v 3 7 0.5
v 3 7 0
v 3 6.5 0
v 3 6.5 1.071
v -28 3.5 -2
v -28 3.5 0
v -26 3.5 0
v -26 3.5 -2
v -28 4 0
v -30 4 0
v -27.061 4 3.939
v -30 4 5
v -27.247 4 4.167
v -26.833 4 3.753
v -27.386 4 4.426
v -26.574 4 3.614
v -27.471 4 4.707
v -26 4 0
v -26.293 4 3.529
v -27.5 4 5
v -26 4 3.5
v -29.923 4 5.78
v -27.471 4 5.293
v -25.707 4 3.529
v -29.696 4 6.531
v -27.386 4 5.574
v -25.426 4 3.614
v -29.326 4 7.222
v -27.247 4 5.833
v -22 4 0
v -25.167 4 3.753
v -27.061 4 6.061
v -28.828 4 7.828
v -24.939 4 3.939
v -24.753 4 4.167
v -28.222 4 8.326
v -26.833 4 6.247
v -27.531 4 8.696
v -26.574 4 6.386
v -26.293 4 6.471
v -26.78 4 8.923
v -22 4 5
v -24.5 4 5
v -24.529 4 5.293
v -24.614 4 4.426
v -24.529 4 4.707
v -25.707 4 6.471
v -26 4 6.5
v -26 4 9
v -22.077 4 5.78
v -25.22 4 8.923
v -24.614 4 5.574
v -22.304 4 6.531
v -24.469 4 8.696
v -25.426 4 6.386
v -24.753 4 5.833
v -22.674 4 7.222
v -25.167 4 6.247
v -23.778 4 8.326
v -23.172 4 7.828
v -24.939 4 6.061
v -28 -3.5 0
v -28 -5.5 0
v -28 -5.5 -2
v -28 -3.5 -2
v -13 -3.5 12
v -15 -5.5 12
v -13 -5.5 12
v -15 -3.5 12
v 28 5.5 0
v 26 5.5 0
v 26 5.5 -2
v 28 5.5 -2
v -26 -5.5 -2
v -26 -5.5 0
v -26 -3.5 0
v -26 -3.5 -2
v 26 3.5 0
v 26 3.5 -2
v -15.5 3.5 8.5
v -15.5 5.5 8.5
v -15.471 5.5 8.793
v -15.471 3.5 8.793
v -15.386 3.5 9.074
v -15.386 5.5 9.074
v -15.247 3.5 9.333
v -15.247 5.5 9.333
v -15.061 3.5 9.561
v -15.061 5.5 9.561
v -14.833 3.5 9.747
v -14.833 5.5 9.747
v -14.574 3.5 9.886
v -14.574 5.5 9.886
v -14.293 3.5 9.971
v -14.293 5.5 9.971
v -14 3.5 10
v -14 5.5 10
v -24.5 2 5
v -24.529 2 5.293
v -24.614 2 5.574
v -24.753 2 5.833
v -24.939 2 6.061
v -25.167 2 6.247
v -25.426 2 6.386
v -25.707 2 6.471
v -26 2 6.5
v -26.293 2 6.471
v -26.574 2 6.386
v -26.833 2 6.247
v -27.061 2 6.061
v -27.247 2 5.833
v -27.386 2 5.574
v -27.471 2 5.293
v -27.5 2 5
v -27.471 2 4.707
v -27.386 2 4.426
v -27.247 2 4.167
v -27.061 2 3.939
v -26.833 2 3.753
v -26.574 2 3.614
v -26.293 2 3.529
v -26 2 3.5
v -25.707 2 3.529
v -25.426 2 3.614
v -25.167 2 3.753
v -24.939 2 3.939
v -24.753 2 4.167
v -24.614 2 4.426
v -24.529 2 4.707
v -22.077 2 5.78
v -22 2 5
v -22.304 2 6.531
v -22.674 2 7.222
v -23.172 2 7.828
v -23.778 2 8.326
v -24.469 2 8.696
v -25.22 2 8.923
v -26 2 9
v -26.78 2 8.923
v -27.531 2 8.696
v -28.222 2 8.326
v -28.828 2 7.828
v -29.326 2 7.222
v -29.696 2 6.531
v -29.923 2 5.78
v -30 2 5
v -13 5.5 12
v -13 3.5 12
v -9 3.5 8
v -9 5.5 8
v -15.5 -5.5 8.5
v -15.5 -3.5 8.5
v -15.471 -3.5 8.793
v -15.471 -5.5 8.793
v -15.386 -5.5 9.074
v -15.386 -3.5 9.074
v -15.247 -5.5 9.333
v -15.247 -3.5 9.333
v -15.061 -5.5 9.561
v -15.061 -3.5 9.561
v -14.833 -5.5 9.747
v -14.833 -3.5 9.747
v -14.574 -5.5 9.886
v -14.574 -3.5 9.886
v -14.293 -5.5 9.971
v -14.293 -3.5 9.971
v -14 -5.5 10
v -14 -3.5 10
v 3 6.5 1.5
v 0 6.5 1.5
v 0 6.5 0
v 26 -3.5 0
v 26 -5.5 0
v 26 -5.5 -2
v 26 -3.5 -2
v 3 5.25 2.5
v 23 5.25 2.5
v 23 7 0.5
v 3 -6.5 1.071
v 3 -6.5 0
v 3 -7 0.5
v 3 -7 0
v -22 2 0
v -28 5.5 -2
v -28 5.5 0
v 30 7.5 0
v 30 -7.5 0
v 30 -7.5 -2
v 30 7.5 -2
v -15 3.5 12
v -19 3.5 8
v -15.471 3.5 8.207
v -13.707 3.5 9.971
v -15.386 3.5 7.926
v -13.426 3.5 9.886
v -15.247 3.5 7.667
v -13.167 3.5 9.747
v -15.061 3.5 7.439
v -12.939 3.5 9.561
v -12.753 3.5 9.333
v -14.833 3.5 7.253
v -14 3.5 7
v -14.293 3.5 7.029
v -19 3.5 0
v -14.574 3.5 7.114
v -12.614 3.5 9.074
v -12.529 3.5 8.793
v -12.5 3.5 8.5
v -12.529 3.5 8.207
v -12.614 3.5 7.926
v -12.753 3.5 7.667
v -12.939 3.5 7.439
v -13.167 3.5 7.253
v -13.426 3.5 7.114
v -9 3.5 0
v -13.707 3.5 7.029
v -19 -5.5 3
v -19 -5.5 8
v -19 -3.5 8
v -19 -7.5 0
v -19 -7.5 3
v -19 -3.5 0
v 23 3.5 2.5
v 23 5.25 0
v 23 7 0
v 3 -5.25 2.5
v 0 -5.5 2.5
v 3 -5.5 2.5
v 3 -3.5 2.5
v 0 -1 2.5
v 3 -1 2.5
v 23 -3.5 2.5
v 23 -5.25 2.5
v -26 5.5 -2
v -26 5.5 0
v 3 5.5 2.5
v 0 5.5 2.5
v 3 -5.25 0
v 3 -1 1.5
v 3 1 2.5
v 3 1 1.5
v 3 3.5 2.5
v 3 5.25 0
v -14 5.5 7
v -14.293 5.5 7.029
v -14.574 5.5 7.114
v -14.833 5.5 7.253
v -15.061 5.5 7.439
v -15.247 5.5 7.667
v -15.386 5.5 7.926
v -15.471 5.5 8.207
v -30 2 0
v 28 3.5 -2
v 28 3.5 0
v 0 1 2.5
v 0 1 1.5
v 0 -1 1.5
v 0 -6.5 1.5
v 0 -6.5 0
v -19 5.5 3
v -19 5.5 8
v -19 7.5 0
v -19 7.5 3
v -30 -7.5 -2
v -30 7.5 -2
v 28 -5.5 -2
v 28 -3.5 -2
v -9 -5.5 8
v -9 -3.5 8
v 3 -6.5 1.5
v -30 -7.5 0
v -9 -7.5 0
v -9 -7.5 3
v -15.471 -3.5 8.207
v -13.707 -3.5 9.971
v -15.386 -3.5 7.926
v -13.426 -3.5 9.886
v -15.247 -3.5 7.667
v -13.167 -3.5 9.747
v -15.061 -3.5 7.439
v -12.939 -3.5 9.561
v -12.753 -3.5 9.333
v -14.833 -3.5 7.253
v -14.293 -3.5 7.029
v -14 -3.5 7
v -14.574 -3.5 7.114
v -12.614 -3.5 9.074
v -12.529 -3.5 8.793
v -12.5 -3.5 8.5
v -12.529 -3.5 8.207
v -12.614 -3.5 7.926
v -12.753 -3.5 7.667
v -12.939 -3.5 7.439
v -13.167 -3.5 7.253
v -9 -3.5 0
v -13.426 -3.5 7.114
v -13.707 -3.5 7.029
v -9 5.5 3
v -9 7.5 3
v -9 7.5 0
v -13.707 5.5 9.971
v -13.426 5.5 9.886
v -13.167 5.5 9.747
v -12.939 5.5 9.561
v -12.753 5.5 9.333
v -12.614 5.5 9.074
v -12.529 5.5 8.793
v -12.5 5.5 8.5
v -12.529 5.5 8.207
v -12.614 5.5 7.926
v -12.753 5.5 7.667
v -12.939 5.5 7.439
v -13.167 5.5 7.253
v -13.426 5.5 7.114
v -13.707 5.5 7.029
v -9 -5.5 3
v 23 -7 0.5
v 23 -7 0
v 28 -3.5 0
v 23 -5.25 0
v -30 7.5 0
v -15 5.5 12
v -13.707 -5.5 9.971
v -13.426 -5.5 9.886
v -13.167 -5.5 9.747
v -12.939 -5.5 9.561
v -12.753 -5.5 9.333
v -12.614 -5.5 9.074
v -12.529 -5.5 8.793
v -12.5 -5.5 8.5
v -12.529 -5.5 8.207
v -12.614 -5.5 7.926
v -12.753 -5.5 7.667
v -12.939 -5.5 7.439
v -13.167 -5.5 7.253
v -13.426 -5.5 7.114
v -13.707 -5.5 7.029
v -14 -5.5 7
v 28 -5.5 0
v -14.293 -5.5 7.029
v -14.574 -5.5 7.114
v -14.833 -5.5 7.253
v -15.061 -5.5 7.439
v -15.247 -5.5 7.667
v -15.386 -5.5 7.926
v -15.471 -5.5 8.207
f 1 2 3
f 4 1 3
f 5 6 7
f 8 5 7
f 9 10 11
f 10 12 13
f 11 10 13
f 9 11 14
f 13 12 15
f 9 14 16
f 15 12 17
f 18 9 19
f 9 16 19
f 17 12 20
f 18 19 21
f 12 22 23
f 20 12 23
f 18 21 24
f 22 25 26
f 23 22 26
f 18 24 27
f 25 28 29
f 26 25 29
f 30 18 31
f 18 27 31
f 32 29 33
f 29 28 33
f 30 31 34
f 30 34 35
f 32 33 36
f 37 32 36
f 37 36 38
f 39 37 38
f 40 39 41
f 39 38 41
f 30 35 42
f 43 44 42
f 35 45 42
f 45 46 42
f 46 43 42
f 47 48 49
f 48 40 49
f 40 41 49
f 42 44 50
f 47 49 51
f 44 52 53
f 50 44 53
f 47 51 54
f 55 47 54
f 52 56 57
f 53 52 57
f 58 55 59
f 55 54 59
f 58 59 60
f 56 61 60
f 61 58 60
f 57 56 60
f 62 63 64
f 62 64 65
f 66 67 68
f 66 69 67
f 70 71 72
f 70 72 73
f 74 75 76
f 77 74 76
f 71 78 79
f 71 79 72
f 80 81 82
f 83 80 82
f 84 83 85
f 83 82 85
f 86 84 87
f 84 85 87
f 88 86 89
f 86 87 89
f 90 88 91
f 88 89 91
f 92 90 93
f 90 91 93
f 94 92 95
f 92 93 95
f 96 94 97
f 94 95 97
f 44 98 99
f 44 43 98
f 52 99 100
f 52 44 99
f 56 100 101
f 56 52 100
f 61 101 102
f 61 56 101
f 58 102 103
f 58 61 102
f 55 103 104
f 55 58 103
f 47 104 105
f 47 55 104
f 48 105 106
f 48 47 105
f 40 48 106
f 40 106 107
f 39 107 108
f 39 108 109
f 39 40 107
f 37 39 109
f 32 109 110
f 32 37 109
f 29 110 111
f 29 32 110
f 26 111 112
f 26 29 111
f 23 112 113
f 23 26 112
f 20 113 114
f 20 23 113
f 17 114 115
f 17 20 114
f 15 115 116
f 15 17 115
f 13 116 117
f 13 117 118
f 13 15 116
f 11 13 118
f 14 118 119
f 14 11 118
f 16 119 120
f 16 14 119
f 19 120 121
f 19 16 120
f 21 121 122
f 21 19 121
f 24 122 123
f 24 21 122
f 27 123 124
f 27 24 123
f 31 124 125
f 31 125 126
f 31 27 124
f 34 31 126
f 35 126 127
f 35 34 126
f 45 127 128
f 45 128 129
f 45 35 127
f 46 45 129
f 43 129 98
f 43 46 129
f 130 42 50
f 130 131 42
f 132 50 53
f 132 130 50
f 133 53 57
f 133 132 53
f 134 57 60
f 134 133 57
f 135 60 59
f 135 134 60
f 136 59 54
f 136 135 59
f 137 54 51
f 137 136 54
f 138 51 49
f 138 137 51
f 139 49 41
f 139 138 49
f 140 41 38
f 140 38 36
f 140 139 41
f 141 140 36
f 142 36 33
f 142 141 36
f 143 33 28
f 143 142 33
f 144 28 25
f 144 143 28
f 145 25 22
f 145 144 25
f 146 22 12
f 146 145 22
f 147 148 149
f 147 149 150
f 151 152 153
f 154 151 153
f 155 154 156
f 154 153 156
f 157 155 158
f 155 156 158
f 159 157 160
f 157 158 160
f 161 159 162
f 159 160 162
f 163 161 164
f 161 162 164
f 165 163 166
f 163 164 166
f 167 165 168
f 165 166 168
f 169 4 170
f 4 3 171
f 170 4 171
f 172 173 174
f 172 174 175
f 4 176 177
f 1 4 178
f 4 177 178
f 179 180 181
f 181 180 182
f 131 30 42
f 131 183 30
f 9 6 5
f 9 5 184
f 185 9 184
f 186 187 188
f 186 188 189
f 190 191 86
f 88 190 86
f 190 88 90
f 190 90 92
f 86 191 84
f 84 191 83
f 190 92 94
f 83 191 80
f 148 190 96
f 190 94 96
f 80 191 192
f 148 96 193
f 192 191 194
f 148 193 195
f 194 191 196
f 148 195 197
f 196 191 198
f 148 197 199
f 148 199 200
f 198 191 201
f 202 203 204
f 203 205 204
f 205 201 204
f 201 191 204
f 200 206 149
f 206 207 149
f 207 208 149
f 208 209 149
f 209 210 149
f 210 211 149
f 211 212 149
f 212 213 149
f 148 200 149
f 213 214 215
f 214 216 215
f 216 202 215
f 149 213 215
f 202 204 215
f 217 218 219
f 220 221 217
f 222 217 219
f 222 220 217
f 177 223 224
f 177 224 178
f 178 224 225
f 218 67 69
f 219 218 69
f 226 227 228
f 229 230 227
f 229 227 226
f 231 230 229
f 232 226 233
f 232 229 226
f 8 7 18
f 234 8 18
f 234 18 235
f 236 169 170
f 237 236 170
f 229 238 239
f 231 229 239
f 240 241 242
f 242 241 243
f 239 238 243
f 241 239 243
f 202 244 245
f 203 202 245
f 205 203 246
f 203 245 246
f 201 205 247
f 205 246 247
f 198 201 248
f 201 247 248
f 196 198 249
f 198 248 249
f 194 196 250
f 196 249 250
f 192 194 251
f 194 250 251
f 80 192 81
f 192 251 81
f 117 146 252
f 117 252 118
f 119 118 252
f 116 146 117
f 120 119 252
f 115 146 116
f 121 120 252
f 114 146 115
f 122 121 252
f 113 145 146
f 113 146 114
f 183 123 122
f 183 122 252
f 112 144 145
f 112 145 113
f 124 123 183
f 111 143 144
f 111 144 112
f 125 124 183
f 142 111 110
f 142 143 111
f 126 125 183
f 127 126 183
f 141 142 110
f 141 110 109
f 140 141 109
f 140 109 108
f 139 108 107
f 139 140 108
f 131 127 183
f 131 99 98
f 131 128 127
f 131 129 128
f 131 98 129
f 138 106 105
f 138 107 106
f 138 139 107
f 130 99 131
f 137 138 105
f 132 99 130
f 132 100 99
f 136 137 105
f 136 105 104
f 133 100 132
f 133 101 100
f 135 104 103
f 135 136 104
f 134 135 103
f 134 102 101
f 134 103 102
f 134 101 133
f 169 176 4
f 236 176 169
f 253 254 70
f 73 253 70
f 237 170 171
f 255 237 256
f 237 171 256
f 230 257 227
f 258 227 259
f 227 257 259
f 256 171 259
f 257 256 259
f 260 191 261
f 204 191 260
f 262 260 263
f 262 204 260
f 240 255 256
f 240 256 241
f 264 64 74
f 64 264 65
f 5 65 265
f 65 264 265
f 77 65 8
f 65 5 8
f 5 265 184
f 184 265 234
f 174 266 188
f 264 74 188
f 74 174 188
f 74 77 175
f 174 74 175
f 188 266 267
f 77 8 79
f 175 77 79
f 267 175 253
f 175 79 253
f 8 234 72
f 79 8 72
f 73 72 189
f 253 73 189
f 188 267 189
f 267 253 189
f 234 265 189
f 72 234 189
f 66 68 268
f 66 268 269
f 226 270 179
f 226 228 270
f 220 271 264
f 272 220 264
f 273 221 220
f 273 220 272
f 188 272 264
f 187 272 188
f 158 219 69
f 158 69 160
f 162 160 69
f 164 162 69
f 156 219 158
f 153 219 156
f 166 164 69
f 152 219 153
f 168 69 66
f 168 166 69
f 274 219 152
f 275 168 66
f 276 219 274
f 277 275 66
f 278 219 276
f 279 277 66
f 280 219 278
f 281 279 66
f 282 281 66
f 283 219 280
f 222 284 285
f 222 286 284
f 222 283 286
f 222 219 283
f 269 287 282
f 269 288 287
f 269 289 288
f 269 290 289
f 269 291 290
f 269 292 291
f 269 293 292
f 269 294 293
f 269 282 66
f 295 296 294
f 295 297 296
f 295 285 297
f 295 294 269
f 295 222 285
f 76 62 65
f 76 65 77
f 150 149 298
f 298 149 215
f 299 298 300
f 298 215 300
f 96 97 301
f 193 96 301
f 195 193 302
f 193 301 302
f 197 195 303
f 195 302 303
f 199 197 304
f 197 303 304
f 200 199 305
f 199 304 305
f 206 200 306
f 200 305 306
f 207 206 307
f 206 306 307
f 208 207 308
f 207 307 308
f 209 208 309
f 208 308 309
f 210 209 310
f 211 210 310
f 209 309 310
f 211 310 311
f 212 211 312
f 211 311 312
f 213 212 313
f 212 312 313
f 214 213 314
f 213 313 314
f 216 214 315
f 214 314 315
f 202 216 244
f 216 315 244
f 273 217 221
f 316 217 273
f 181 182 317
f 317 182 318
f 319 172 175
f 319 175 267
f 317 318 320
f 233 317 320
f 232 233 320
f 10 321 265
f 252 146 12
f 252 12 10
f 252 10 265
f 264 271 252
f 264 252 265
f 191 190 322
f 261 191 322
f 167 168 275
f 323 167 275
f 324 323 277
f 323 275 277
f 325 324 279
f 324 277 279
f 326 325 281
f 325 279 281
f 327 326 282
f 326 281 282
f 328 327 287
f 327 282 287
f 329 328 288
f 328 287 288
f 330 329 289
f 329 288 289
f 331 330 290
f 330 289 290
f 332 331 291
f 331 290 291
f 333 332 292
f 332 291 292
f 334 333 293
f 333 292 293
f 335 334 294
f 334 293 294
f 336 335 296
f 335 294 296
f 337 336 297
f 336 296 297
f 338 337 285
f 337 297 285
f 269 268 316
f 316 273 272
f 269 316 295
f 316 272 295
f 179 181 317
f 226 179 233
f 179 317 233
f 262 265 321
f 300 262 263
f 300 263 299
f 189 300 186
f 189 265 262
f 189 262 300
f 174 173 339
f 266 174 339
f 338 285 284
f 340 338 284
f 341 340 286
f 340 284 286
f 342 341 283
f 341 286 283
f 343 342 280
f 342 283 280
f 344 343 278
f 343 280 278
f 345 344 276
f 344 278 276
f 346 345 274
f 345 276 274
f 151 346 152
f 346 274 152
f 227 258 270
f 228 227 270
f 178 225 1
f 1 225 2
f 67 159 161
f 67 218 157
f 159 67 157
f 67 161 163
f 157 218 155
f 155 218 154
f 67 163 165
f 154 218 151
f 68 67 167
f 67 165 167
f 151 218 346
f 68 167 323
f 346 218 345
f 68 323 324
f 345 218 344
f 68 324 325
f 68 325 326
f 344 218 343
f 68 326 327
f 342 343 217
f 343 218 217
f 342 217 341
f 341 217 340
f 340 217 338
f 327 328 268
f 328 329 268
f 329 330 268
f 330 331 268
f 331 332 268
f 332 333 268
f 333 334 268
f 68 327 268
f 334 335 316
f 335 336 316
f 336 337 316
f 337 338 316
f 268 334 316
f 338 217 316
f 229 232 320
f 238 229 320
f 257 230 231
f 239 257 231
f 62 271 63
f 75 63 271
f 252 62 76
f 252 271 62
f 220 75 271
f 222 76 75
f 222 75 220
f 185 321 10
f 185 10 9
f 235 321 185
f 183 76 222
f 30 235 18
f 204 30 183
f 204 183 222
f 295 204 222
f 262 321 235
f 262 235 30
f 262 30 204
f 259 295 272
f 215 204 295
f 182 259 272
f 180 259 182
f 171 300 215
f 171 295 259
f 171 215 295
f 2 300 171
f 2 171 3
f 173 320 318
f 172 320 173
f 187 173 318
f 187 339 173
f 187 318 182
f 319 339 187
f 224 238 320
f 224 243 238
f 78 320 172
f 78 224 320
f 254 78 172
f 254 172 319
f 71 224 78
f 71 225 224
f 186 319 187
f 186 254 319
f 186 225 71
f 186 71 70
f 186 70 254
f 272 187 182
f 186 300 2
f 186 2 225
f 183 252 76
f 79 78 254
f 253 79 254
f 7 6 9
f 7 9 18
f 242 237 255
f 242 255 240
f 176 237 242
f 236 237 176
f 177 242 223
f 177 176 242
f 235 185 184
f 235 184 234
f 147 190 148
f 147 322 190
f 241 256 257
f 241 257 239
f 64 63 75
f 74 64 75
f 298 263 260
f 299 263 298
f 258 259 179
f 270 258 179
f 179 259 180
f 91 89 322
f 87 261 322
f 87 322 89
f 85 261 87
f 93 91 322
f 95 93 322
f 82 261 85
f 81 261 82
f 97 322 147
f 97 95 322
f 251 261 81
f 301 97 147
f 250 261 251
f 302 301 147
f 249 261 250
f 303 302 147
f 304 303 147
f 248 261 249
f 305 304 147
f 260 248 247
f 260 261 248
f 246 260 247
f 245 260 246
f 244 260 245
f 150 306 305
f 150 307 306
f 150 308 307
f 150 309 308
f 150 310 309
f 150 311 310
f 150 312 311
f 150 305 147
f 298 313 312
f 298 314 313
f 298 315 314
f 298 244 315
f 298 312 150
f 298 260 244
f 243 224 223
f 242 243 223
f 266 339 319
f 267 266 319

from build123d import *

# Parameters (mm, degrees)
F0_W      = 10
F0_H      = 2
F0_W_2    = 2
F1_DEPTH  = 2
F2_DEPTH  = 12
F4_DEPTH  = 25
F5_DEPTH  = 3
F7_R      = 1.5
F8_DEPTH  = 1
F9_SIZE   = 4
F10_SIZE  = 4
F11_DEPTH = 2.5
F13_DEPTH = 20
F14_SIZE  = 1
F15_W     = 3
F15_H     = 2
F16_DEPTH = 1


with BuildPart() as f1:
    # F0 (on Top) → F1 (new body)
    with BuildSketch(Plane.XY):
        with Locations((-14, -6.5)):
            Rectangle(F0_W, F0_H)
        with Locations((-14, 6.5)):
            Rectangle(F0_W, F0_H)
        Polygon((-30, 7.5), (-30, -7.5), (-19, -7.5), (-19, -5.5), (-19, -3.5), (-9, -3.5), (-9, -5.5), (-9, -7.5), (30, -7.5), (30, 7.5), (-9, 7.5), (-9, 5.5), (-9, 3.5), (-19, 3.5), (-19, 5.5), (-19, 7.5), align=None)
        with Locations((-27, -4.5)):
            Rectangle(F0_W_2, F0_H, mode=Mode.SUBTRACT)
        with Locations((27, -4.5)):
            Rectangle(F0_W_2, F0_H, mode=Mode.SUBTRACT)
        with Locations((-27, 4.5)):
            Rectangle(F0_W_2, F0_H, mode=Mode.SUBTRACT)
        Polygon((3, 3.5), (3, -3.5), (23, -3.5), (23, -7), (3, -7), (3, -6.5), (0, -6.5), (0, 6.5), (3, 6.5), (3, 7), (23, 7), (23, 3.5), align=None, mode=Mode.SUBTRACT)
        with Locations((27, 4.5)):
            Rectangle(F0_W_2, F0_H, mode=Mode.SUBTRACT)
        with Locations((-14, 4.5)):
            Rectangle(F0_W, F0_H)
        with Locations((-14, -4.5)):
            Rectangle(F0_W, F0_H)
        Polygon((3, 6.5), (3, 3.5), (23, 3.5), (23, 7), (3, 7), align=None)
        Polygon((23, -3.5), (3, -3.5), (3, -6.5), (3, -7), (23, -7), align=None)
        Polygon((3, -6.5), (3, -3.5), (3, 3.5), (3, 6.5), (0, 6.5), (0, -6.5), align=None)
    extrude(amount=-F1_DEPTH)

    # F0 (on Top) → F2 (join)
    with BuildSketch(Plane.XY):
        with Locations((-14, 4.5)):
            Rectangle(F0_W, F0_H)
        with Locations((-14, -4.5)):
            Rectangle(F0_W, F0_H)
    extrude(amount=F2_DEPTH)

    # F3 (on face) → F4 (cut)
    with BuildSketch(Plane(origin=(0, 5.5, 0), x_dir=(-1, 0, 0), z_dir=(0, 1, 0))):
        with BuildLine():
            Line((14, 7), (14, 10))
            ThreePointArc((14, 10), (12.5, 8.5), (14, 7))
        make_face()
        with BuildLine():
            ThreePointArc((14, 7), (15.0606601718, 7.4393398282), (15.5, 8.5))
            ThreePointArc((15.5, 8.5), (15.0606601718, 9.5606601718), (14, 10))
            Line((14, 10), (14, 7))
        make_face()
    extrude(amount=-F4_DEPTH, mode=Mode.SUBTRACT)

    # F0 (on Top) → F5 (join)
    with BuildSketch(Plane.XY):
        with Locations((-14, 6.5)):
            Rectangle(F0_W, F0_H)
        with Locations((-14, -6.5)):
            Rectangle(F0_W, F0_H)
    extrude(amount=F5_DEPTH)

    # F7 (on offset) → F8 (join, symmetric)
    with BuildSketch(Plane.XZ.offset(-3)):
        with BuildLine():
            ThreePointArc((-30, 5), (-26, 1), (-22, 5))
            ThreePointArc((-22, 5), (-26, 9), (-30, 5))
        make_face()
        with Locations((-26, 5)):
            Circle(F7_R, mode=Mode.SUBTRACT)
        with BuildLine():
            Line((-22, 0), (-22, 5))
            ThreePointArc((-22, 5), (-26, 1), (-30, 5))
            Line((-30, 5), (-30, 0))
            Line((-30, 0), (-22, 0))
        make_face()
    extrude(amount=F8_DEPTH, both=True)

    # F9
    f9_edges = [f1.edges().sort_by_distance(p)[0] for p in [
        (-9, 4.5, 12),
        (-19, 4.5, 12),
    ]]
    chamfer(f9_edges, length=F9_SIZE)

    # F10
    f10_edges = [f1.edges().sort_by_distance(p)[0] for p in [
        (-9, -4.5, 12),
        (-19, -4.5, 12),
    ]]
    chamfer(f10_edges, length=F10_SIZE)

    # F0 (on Top) → F11 (join)
    with BuildSketch(Plane.XY):
        Polygon((23, -3.5), (3, -3.5), (3, -6.5), (3, -7), (23, -7), align=None)
        Polygon((3, 6.5), (3, 3.5), (23, 3.5), (23, 7), (3, 7), align=None)
        Polygon((3, -6.5), (3, -3.5), (3, 3.5), (3, 6.5), (0, 6.5), (0, -6.5), align=None)
    extrude(amount=F11_DEPTH)

    # F12 (on face) → F13 (cut)
    with BuildSketch(Plane.YZ.offset(23)):
        Polygon((-3.5, 2.5), (-5.25, 0), (-3.5, 0), align=None)
        Polygon((-7, 0.5), (-5.25, 2.5), (-7, 2.5), align=None)
        Polygon((7, 0.5), (7, 2.5), (5.25, 2.5), align=None)
        Polygon((5.25, 0), (3.5, 2.5), (3.5, 0), align=None)
    extrude(amount=-F13_DEPTH, mode=Mode.SUBTRACT)

    # F14
    f14_edges = [f1.edges().sort_by_distance(p)[0] for p in [
        (1.5, 6.5, 2.5),
        (1.5, -6.5, 2.5),
    ]]
    chamfer(f14_edges, length=F14_SIZE)

    # F15 (on face) → F16 (cut)
    with BuildSketch(Plane.XY.offset(2.5)):
        with Locations((1.5, 0)):
            Rectangle(F15_W, F15_H)
    extrude(amount=-F16_DEPTH, mode=Mode.SUBTRACT)


solid = f1.part
